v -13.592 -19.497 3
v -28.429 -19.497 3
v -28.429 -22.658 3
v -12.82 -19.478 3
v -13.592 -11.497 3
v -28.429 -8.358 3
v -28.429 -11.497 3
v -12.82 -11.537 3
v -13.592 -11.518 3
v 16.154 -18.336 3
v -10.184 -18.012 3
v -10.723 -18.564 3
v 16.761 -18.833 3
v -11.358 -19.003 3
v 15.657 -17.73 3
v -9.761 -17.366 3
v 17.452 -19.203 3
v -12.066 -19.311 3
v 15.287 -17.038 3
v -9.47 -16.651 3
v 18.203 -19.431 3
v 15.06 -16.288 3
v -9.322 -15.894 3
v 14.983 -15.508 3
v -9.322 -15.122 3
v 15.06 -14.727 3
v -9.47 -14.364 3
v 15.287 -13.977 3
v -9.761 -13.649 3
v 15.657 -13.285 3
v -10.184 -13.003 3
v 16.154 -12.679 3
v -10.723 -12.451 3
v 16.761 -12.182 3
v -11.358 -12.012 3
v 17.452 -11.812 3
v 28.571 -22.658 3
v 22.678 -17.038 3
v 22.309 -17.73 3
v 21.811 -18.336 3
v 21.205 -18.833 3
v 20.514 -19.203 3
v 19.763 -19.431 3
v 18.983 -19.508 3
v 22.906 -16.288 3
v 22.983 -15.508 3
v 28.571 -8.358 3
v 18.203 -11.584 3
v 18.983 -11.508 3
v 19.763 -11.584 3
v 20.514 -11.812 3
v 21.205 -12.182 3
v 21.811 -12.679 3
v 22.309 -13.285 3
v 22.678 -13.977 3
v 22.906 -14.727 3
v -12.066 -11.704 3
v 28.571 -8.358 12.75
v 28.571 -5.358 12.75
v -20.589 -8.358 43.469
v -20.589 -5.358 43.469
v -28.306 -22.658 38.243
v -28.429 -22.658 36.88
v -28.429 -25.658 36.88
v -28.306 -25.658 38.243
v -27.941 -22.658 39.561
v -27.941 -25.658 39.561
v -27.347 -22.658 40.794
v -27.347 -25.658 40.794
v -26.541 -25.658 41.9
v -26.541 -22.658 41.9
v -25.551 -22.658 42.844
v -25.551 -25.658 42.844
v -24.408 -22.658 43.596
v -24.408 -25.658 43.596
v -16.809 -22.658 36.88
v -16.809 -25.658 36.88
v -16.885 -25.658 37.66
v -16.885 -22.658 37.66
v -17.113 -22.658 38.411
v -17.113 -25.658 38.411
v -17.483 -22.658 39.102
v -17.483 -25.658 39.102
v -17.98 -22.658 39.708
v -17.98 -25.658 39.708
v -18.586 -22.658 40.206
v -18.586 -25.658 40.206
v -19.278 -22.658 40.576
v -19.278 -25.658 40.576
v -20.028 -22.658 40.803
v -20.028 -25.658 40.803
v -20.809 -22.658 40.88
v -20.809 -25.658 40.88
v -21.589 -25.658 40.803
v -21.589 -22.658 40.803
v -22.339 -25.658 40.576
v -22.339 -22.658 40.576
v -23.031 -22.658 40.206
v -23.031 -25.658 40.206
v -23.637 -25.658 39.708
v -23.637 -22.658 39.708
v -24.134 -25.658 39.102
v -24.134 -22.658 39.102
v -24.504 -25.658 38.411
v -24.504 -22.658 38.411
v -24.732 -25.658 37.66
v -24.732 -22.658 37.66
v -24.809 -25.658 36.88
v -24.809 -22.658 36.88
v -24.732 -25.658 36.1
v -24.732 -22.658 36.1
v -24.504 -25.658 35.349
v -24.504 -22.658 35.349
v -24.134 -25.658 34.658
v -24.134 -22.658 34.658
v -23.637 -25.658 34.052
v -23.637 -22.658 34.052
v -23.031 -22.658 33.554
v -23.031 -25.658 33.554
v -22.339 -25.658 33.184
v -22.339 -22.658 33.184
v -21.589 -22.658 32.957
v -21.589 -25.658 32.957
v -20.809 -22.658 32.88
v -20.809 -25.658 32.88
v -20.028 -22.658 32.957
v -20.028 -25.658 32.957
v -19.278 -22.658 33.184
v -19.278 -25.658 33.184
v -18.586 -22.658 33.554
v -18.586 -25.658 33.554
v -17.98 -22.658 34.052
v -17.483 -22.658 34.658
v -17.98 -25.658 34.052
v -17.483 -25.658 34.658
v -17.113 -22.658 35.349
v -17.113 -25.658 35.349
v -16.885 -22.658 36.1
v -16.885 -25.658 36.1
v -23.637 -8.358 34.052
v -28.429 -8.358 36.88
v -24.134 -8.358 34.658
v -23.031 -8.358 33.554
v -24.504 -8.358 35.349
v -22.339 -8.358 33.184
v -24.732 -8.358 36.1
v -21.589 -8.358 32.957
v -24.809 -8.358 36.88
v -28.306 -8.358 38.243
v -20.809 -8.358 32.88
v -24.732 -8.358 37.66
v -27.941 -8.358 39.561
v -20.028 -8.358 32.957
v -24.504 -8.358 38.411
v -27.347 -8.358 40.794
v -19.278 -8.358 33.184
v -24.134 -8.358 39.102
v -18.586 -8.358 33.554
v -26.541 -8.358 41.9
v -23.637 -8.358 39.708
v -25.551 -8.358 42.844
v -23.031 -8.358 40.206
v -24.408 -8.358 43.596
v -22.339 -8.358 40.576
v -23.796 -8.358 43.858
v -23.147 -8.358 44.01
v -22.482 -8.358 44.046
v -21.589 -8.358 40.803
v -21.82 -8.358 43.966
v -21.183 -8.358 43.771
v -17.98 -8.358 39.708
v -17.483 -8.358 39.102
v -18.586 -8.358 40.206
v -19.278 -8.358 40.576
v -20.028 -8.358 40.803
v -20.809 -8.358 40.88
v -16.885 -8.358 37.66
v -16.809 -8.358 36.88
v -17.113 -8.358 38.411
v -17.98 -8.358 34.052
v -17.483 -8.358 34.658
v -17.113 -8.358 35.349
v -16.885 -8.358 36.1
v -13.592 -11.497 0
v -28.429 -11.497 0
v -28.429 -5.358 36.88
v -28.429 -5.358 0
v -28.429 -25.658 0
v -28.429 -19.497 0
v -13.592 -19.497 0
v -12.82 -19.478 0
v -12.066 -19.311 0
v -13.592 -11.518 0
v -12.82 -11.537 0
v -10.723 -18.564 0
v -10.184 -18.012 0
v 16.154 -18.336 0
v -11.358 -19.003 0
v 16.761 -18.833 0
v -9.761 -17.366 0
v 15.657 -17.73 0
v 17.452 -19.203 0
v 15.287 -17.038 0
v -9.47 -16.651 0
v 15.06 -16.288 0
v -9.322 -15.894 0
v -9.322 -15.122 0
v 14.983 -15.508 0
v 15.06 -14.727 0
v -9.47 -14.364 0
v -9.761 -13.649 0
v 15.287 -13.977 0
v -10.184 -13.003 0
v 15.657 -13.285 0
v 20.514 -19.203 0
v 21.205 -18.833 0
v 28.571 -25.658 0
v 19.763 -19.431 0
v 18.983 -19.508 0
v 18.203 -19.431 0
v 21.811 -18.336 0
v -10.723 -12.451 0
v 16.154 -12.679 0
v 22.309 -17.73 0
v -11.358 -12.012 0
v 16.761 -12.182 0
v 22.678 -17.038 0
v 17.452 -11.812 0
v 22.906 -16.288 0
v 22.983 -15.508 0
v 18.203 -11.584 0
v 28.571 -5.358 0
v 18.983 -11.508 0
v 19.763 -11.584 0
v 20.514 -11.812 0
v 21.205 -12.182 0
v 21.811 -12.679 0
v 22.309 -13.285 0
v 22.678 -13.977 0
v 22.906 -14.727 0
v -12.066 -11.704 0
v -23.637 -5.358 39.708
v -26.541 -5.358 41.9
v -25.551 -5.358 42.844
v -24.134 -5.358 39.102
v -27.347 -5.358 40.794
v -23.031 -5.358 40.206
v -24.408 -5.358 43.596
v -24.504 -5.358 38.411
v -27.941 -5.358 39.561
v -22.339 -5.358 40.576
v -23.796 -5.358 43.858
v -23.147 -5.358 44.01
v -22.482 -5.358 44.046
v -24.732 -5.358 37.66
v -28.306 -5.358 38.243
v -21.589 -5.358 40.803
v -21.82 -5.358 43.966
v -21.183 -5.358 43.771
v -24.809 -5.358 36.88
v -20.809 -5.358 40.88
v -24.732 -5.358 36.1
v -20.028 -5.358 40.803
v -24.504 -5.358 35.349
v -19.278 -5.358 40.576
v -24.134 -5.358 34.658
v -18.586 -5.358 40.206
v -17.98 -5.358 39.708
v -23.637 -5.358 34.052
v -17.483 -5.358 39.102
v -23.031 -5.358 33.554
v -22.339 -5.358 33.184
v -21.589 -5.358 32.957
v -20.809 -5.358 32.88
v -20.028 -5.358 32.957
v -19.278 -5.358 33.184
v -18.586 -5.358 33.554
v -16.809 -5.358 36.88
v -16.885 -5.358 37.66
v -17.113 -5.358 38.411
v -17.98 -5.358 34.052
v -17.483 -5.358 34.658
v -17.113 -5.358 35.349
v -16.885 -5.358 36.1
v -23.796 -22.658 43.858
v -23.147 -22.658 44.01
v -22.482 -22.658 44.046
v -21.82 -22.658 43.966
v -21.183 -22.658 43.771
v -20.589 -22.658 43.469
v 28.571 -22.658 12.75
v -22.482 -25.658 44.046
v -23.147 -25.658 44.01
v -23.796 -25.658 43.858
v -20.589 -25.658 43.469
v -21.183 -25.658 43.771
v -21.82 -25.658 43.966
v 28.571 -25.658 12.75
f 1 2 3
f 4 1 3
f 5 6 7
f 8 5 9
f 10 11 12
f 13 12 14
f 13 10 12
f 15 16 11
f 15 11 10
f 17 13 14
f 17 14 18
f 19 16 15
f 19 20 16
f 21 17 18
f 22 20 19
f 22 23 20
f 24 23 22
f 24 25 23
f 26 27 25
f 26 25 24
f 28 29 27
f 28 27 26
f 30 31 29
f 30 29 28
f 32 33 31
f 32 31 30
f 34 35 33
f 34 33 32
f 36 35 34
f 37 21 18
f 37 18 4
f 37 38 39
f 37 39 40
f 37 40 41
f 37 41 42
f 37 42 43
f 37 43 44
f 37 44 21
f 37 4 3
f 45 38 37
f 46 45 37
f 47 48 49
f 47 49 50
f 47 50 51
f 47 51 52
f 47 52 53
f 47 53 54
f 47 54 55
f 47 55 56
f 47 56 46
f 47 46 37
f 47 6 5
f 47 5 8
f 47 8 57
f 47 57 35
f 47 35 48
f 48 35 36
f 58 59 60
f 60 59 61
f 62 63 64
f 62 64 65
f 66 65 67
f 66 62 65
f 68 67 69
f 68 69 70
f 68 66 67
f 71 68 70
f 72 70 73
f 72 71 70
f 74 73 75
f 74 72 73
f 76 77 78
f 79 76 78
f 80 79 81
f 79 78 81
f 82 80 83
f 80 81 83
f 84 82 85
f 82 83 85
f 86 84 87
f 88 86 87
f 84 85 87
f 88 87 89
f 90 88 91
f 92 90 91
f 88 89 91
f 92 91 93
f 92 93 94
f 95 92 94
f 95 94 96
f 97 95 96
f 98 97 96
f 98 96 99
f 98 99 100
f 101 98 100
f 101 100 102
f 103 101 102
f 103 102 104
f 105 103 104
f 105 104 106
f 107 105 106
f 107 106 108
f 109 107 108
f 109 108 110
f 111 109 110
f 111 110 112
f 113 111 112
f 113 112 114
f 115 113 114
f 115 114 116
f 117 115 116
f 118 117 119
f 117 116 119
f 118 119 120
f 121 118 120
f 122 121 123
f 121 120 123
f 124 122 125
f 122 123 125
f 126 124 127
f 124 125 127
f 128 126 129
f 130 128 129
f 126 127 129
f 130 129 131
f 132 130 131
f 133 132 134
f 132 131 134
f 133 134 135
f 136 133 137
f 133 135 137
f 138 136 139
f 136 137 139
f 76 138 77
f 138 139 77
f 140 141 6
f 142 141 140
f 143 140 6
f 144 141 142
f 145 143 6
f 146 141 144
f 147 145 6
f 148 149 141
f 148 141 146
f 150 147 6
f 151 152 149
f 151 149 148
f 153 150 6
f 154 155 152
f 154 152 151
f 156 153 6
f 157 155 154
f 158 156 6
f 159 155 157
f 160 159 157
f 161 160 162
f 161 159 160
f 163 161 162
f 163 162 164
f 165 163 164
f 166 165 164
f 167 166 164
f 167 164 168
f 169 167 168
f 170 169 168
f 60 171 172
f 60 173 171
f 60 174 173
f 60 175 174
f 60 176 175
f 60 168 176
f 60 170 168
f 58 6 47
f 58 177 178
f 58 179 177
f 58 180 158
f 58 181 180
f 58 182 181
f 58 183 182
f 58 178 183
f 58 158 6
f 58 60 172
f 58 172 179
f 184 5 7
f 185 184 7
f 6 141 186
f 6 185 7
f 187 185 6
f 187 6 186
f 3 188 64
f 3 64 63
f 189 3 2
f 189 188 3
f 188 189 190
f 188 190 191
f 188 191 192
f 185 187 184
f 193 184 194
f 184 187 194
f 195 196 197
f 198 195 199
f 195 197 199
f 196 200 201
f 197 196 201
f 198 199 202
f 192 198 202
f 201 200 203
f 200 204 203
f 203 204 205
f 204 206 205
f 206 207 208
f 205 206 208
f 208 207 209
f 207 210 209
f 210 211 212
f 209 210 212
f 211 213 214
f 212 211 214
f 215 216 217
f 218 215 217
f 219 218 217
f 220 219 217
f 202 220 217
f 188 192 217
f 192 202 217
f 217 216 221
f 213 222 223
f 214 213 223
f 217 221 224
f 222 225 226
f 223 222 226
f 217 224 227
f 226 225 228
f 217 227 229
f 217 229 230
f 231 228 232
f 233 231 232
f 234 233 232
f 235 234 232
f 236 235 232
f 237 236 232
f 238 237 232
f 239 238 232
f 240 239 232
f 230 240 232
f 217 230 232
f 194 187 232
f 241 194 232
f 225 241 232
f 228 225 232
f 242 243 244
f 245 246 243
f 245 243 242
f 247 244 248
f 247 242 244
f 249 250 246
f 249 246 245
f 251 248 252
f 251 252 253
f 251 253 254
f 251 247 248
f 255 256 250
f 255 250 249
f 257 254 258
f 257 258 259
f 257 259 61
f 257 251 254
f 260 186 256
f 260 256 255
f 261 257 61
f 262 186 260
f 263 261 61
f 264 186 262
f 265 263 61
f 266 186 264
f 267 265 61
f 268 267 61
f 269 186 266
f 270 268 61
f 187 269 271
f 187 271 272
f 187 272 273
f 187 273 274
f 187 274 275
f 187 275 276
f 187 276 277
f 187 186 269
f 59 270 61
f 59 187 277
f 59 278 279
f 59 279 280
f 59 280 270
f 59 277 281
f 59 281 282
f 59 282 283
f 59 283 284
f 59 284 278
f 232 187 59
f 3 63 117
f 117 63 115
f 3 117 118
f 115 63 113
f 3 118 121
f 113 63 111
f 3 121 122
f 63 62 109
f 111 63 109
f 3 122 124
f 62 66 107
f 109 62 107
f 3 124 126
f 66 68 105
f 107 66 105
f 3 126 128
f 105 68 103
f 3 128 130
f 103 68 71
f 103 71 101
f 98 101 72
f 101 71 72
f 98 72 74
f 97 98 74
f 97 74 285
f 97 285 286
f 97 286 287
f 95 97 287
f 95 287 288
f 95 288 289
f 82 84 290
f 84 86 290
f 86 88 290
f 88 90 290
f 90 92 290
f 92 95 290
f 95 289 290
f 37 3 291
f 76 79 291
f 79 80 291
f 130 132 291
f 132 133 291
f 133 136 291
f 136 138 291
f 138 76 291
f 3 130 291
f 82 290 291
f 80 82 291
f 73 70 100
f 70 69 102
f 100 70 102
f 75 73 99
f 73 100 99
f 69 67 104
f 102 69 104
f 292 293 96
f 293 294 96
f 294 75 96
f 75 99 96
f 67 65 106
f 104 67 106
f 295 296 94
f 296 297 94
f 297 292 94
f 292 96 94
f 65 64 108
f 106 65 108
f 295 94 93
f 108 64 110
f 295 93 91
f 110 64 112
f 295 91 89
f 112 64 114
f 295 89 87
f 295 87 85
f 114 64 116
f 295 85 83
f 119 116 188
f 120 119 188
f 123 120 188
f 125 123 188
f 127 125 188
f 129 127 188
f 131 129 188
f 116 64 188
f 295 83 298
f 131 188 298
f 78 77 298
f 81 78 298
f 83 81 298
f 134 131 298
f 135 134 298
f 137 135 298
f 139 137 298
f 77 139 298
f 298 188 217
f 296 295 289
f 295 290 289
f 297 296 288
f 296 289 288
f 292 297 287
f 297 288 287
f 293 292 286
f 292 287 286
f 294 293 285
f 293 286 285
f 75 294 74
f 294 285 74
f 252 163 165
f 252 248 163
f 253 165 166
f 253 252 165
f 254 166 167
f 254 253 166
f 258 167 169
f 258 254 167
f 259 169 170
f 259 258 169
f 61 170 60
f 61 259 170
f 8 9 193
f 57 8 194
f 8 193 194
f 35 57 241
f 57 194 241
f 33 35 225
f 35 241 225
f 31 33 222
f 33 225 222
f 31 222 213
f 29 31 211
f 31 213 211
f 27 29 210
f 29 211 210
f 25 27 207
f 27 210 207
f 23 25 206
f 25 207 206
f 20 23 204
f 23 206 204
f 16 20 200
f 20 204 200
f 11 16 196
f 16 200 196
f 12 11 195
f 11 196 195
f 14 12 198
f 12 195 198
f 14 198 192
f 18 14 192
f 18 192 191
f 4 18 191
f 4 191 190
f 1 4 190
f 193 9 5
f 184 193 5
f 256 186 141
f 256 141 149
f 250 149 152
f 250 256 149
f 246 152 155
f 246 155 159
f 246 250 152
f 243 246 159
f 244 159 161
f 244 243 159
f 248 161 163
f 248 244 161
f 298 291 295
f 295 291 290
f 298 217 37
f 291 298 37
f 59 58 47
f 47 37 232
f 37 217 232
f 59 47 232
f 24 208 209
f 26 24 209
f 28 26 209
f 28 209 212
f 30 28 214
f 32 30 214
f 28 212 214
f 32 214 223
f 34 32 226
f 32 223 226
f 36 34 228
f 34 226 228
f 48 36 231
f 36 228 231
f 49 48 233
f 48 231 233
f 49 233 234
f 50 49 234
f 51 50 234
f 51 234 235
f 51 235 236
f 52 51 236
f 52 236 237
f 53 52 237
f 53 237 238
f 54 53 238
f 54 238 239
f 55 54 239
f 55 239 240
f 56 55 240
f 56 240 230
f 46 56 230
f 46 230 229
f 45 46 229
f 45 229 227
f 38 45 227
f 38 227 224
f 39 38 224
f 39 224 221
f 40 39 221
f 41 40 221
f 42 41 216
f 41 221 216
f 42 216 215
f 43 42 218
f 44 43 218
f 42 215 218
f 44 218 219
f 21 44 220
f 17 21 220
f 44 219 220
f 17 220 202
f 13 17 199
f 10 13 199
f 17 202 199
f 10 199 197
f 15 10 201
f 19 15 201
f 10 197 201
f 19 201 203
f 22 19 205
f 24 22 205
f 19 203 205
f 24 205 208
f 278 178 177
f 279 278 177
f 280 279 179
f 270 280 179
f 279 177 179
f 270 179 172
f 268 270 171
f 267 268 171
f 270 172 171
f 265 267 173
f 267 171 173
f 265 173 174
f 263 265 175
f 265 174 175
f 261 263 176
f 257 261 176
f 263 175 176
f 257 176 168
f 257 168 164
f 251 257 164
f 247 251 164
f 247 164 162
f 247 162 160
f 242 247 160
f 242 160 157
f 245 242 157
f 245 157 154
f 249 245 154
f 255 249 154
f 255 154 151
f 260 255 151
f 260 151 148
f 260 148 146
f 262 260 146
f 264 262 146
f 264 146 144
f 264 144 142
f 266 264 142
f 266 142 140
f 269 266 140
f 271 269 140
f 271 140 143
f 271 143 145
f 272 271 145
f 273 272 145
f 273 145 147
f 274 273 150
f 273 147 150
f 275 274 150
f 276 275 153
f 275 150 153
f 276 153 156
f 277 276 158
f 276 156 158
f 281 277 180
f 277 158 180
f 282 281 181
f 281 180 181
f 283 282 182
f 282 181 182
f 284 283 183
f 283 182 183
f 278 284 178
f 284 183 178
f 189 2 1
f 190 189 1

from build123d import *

# Parameters (mm, degrees)
F0_W        = 57
F0_H        = 20.3
F1_DEPTH    = 44.5
F2_W        = 57
F2_H        = 14.3
F3_DEPTH    = 41.5
F4_R        = 7.62
F5_T1_DEPTH = 265.7262717185
F7_R        = 4
F8_DEPTH    = 25.4
F10_D       = 8
F12_D       = 8
F14_DEPTH   = 25.4
F15_R       = 3.81


# Not quite as in the source:
# - a fillet or chamfer that OpenCascade refuses, or shapes differently, is made with other operations: its cross-section is extruded or revolved along the edge and cut away or added
# - a feature of the source that left no trace in its solid (it failed there, or was rolled back) is left out


with BuildPart() as f1:
    # F0 (on Top) → F1 (new body)
    with BuildSketch(Plane.XY):
        with Locations((0.0714529306, -15.5075108656)):
            Rectangle(F0_W, F0_H)
    extrude(amount=F1_DEPTH)

    # F2 (on face) → F3 (cut)
    with BuildSketch(Plane.XY.offset(44.5)):
        with Locations((0.0714529306, -15.5075108656)):
            Rectangle(F2_W, F2_H)
    extrude(amount=-F3_DEPTH, mode=Mode.SUBTRACT)

    # F4
    f4_edges = [f1.edges().sort_by_distance(p)[0] for p in [
        (-28.428547, -24.157511, 44.5),
        (-28.428547, -6.857511, 44.5),
    ]]
    fillet(f4_edges, radius=F4_R)

    # F5: chamfer of 31.75 x 50.8106212971 on 1 edges, made by hand

    # F5_s2 → F5_t1 (cut)
    with BuildSketch(Plane.XZ.offset(-108.7056249936)):
        Polygon((28.5714529306, 12.75), (-22.2391683665, 44.5), (28.5714529306, 44.5), align=None)
    extrude(amount=F5_T1_DEPTH, mode=Mode.SUBTRACT)

    # F7 (on face) → F8 (cut)
    with BuildSketch(Plane.XZ.offset(25.6575108656)):
        with Locations((-20.8085470694, 36.88)):
            Circle(F7_R)
    extrude(amount=-F8_DEPTH, mode=Mode.SUBTRACT)

    # F10 (through all)
    with Locations(Plane.XY.offset(3)):
        with Locations((18.9828891307, -15.5075108656)):
            Hole(F10_D / 2)

    # F12 (through all)
    with Locations(Plane.XY.offset(3)):
        with Locations((-13.3028933778, -15.5075108656)):
            Hole(F12_D / 2)

    # F13 (on face) → F14 (cut)
    with BuildSketch(Plane.XY.offset(3)):
        with BuildLine():
            Line((-28.4285470694, -19.4970791591), (-13.5915884278, -19.4970791591))
            ThreePointArc((-13.5915884278, -19.4970791591), (-17.3028933778, -15.5075108656), (-13.5915884278, -11.5179425722))
            Line((-13.5915884278, -11.5179425722), (-13.5915884278, -11.4970791591))
            Line((-13.5915884278, -11.4970791591), (-28.4285470694, -11.4970791591))
            Line((-28.4285470694, -11.4970791591), (-28.4285470694, -19.4970791591))
        make_face()
    extrude(amount=-F14_DEPTH, mode=Mode.SUBTRACT)

    # F15
    f15_edges = [f1.edges().sort_by_distance(p)[0] for p in [
        (-22.070718, -24.157511, 44.39474),
        (-22.070718, -6.857511, 44.39474),
    ]]
    fillet(f15_edges, radius=F15_R)


solid = f1.part
